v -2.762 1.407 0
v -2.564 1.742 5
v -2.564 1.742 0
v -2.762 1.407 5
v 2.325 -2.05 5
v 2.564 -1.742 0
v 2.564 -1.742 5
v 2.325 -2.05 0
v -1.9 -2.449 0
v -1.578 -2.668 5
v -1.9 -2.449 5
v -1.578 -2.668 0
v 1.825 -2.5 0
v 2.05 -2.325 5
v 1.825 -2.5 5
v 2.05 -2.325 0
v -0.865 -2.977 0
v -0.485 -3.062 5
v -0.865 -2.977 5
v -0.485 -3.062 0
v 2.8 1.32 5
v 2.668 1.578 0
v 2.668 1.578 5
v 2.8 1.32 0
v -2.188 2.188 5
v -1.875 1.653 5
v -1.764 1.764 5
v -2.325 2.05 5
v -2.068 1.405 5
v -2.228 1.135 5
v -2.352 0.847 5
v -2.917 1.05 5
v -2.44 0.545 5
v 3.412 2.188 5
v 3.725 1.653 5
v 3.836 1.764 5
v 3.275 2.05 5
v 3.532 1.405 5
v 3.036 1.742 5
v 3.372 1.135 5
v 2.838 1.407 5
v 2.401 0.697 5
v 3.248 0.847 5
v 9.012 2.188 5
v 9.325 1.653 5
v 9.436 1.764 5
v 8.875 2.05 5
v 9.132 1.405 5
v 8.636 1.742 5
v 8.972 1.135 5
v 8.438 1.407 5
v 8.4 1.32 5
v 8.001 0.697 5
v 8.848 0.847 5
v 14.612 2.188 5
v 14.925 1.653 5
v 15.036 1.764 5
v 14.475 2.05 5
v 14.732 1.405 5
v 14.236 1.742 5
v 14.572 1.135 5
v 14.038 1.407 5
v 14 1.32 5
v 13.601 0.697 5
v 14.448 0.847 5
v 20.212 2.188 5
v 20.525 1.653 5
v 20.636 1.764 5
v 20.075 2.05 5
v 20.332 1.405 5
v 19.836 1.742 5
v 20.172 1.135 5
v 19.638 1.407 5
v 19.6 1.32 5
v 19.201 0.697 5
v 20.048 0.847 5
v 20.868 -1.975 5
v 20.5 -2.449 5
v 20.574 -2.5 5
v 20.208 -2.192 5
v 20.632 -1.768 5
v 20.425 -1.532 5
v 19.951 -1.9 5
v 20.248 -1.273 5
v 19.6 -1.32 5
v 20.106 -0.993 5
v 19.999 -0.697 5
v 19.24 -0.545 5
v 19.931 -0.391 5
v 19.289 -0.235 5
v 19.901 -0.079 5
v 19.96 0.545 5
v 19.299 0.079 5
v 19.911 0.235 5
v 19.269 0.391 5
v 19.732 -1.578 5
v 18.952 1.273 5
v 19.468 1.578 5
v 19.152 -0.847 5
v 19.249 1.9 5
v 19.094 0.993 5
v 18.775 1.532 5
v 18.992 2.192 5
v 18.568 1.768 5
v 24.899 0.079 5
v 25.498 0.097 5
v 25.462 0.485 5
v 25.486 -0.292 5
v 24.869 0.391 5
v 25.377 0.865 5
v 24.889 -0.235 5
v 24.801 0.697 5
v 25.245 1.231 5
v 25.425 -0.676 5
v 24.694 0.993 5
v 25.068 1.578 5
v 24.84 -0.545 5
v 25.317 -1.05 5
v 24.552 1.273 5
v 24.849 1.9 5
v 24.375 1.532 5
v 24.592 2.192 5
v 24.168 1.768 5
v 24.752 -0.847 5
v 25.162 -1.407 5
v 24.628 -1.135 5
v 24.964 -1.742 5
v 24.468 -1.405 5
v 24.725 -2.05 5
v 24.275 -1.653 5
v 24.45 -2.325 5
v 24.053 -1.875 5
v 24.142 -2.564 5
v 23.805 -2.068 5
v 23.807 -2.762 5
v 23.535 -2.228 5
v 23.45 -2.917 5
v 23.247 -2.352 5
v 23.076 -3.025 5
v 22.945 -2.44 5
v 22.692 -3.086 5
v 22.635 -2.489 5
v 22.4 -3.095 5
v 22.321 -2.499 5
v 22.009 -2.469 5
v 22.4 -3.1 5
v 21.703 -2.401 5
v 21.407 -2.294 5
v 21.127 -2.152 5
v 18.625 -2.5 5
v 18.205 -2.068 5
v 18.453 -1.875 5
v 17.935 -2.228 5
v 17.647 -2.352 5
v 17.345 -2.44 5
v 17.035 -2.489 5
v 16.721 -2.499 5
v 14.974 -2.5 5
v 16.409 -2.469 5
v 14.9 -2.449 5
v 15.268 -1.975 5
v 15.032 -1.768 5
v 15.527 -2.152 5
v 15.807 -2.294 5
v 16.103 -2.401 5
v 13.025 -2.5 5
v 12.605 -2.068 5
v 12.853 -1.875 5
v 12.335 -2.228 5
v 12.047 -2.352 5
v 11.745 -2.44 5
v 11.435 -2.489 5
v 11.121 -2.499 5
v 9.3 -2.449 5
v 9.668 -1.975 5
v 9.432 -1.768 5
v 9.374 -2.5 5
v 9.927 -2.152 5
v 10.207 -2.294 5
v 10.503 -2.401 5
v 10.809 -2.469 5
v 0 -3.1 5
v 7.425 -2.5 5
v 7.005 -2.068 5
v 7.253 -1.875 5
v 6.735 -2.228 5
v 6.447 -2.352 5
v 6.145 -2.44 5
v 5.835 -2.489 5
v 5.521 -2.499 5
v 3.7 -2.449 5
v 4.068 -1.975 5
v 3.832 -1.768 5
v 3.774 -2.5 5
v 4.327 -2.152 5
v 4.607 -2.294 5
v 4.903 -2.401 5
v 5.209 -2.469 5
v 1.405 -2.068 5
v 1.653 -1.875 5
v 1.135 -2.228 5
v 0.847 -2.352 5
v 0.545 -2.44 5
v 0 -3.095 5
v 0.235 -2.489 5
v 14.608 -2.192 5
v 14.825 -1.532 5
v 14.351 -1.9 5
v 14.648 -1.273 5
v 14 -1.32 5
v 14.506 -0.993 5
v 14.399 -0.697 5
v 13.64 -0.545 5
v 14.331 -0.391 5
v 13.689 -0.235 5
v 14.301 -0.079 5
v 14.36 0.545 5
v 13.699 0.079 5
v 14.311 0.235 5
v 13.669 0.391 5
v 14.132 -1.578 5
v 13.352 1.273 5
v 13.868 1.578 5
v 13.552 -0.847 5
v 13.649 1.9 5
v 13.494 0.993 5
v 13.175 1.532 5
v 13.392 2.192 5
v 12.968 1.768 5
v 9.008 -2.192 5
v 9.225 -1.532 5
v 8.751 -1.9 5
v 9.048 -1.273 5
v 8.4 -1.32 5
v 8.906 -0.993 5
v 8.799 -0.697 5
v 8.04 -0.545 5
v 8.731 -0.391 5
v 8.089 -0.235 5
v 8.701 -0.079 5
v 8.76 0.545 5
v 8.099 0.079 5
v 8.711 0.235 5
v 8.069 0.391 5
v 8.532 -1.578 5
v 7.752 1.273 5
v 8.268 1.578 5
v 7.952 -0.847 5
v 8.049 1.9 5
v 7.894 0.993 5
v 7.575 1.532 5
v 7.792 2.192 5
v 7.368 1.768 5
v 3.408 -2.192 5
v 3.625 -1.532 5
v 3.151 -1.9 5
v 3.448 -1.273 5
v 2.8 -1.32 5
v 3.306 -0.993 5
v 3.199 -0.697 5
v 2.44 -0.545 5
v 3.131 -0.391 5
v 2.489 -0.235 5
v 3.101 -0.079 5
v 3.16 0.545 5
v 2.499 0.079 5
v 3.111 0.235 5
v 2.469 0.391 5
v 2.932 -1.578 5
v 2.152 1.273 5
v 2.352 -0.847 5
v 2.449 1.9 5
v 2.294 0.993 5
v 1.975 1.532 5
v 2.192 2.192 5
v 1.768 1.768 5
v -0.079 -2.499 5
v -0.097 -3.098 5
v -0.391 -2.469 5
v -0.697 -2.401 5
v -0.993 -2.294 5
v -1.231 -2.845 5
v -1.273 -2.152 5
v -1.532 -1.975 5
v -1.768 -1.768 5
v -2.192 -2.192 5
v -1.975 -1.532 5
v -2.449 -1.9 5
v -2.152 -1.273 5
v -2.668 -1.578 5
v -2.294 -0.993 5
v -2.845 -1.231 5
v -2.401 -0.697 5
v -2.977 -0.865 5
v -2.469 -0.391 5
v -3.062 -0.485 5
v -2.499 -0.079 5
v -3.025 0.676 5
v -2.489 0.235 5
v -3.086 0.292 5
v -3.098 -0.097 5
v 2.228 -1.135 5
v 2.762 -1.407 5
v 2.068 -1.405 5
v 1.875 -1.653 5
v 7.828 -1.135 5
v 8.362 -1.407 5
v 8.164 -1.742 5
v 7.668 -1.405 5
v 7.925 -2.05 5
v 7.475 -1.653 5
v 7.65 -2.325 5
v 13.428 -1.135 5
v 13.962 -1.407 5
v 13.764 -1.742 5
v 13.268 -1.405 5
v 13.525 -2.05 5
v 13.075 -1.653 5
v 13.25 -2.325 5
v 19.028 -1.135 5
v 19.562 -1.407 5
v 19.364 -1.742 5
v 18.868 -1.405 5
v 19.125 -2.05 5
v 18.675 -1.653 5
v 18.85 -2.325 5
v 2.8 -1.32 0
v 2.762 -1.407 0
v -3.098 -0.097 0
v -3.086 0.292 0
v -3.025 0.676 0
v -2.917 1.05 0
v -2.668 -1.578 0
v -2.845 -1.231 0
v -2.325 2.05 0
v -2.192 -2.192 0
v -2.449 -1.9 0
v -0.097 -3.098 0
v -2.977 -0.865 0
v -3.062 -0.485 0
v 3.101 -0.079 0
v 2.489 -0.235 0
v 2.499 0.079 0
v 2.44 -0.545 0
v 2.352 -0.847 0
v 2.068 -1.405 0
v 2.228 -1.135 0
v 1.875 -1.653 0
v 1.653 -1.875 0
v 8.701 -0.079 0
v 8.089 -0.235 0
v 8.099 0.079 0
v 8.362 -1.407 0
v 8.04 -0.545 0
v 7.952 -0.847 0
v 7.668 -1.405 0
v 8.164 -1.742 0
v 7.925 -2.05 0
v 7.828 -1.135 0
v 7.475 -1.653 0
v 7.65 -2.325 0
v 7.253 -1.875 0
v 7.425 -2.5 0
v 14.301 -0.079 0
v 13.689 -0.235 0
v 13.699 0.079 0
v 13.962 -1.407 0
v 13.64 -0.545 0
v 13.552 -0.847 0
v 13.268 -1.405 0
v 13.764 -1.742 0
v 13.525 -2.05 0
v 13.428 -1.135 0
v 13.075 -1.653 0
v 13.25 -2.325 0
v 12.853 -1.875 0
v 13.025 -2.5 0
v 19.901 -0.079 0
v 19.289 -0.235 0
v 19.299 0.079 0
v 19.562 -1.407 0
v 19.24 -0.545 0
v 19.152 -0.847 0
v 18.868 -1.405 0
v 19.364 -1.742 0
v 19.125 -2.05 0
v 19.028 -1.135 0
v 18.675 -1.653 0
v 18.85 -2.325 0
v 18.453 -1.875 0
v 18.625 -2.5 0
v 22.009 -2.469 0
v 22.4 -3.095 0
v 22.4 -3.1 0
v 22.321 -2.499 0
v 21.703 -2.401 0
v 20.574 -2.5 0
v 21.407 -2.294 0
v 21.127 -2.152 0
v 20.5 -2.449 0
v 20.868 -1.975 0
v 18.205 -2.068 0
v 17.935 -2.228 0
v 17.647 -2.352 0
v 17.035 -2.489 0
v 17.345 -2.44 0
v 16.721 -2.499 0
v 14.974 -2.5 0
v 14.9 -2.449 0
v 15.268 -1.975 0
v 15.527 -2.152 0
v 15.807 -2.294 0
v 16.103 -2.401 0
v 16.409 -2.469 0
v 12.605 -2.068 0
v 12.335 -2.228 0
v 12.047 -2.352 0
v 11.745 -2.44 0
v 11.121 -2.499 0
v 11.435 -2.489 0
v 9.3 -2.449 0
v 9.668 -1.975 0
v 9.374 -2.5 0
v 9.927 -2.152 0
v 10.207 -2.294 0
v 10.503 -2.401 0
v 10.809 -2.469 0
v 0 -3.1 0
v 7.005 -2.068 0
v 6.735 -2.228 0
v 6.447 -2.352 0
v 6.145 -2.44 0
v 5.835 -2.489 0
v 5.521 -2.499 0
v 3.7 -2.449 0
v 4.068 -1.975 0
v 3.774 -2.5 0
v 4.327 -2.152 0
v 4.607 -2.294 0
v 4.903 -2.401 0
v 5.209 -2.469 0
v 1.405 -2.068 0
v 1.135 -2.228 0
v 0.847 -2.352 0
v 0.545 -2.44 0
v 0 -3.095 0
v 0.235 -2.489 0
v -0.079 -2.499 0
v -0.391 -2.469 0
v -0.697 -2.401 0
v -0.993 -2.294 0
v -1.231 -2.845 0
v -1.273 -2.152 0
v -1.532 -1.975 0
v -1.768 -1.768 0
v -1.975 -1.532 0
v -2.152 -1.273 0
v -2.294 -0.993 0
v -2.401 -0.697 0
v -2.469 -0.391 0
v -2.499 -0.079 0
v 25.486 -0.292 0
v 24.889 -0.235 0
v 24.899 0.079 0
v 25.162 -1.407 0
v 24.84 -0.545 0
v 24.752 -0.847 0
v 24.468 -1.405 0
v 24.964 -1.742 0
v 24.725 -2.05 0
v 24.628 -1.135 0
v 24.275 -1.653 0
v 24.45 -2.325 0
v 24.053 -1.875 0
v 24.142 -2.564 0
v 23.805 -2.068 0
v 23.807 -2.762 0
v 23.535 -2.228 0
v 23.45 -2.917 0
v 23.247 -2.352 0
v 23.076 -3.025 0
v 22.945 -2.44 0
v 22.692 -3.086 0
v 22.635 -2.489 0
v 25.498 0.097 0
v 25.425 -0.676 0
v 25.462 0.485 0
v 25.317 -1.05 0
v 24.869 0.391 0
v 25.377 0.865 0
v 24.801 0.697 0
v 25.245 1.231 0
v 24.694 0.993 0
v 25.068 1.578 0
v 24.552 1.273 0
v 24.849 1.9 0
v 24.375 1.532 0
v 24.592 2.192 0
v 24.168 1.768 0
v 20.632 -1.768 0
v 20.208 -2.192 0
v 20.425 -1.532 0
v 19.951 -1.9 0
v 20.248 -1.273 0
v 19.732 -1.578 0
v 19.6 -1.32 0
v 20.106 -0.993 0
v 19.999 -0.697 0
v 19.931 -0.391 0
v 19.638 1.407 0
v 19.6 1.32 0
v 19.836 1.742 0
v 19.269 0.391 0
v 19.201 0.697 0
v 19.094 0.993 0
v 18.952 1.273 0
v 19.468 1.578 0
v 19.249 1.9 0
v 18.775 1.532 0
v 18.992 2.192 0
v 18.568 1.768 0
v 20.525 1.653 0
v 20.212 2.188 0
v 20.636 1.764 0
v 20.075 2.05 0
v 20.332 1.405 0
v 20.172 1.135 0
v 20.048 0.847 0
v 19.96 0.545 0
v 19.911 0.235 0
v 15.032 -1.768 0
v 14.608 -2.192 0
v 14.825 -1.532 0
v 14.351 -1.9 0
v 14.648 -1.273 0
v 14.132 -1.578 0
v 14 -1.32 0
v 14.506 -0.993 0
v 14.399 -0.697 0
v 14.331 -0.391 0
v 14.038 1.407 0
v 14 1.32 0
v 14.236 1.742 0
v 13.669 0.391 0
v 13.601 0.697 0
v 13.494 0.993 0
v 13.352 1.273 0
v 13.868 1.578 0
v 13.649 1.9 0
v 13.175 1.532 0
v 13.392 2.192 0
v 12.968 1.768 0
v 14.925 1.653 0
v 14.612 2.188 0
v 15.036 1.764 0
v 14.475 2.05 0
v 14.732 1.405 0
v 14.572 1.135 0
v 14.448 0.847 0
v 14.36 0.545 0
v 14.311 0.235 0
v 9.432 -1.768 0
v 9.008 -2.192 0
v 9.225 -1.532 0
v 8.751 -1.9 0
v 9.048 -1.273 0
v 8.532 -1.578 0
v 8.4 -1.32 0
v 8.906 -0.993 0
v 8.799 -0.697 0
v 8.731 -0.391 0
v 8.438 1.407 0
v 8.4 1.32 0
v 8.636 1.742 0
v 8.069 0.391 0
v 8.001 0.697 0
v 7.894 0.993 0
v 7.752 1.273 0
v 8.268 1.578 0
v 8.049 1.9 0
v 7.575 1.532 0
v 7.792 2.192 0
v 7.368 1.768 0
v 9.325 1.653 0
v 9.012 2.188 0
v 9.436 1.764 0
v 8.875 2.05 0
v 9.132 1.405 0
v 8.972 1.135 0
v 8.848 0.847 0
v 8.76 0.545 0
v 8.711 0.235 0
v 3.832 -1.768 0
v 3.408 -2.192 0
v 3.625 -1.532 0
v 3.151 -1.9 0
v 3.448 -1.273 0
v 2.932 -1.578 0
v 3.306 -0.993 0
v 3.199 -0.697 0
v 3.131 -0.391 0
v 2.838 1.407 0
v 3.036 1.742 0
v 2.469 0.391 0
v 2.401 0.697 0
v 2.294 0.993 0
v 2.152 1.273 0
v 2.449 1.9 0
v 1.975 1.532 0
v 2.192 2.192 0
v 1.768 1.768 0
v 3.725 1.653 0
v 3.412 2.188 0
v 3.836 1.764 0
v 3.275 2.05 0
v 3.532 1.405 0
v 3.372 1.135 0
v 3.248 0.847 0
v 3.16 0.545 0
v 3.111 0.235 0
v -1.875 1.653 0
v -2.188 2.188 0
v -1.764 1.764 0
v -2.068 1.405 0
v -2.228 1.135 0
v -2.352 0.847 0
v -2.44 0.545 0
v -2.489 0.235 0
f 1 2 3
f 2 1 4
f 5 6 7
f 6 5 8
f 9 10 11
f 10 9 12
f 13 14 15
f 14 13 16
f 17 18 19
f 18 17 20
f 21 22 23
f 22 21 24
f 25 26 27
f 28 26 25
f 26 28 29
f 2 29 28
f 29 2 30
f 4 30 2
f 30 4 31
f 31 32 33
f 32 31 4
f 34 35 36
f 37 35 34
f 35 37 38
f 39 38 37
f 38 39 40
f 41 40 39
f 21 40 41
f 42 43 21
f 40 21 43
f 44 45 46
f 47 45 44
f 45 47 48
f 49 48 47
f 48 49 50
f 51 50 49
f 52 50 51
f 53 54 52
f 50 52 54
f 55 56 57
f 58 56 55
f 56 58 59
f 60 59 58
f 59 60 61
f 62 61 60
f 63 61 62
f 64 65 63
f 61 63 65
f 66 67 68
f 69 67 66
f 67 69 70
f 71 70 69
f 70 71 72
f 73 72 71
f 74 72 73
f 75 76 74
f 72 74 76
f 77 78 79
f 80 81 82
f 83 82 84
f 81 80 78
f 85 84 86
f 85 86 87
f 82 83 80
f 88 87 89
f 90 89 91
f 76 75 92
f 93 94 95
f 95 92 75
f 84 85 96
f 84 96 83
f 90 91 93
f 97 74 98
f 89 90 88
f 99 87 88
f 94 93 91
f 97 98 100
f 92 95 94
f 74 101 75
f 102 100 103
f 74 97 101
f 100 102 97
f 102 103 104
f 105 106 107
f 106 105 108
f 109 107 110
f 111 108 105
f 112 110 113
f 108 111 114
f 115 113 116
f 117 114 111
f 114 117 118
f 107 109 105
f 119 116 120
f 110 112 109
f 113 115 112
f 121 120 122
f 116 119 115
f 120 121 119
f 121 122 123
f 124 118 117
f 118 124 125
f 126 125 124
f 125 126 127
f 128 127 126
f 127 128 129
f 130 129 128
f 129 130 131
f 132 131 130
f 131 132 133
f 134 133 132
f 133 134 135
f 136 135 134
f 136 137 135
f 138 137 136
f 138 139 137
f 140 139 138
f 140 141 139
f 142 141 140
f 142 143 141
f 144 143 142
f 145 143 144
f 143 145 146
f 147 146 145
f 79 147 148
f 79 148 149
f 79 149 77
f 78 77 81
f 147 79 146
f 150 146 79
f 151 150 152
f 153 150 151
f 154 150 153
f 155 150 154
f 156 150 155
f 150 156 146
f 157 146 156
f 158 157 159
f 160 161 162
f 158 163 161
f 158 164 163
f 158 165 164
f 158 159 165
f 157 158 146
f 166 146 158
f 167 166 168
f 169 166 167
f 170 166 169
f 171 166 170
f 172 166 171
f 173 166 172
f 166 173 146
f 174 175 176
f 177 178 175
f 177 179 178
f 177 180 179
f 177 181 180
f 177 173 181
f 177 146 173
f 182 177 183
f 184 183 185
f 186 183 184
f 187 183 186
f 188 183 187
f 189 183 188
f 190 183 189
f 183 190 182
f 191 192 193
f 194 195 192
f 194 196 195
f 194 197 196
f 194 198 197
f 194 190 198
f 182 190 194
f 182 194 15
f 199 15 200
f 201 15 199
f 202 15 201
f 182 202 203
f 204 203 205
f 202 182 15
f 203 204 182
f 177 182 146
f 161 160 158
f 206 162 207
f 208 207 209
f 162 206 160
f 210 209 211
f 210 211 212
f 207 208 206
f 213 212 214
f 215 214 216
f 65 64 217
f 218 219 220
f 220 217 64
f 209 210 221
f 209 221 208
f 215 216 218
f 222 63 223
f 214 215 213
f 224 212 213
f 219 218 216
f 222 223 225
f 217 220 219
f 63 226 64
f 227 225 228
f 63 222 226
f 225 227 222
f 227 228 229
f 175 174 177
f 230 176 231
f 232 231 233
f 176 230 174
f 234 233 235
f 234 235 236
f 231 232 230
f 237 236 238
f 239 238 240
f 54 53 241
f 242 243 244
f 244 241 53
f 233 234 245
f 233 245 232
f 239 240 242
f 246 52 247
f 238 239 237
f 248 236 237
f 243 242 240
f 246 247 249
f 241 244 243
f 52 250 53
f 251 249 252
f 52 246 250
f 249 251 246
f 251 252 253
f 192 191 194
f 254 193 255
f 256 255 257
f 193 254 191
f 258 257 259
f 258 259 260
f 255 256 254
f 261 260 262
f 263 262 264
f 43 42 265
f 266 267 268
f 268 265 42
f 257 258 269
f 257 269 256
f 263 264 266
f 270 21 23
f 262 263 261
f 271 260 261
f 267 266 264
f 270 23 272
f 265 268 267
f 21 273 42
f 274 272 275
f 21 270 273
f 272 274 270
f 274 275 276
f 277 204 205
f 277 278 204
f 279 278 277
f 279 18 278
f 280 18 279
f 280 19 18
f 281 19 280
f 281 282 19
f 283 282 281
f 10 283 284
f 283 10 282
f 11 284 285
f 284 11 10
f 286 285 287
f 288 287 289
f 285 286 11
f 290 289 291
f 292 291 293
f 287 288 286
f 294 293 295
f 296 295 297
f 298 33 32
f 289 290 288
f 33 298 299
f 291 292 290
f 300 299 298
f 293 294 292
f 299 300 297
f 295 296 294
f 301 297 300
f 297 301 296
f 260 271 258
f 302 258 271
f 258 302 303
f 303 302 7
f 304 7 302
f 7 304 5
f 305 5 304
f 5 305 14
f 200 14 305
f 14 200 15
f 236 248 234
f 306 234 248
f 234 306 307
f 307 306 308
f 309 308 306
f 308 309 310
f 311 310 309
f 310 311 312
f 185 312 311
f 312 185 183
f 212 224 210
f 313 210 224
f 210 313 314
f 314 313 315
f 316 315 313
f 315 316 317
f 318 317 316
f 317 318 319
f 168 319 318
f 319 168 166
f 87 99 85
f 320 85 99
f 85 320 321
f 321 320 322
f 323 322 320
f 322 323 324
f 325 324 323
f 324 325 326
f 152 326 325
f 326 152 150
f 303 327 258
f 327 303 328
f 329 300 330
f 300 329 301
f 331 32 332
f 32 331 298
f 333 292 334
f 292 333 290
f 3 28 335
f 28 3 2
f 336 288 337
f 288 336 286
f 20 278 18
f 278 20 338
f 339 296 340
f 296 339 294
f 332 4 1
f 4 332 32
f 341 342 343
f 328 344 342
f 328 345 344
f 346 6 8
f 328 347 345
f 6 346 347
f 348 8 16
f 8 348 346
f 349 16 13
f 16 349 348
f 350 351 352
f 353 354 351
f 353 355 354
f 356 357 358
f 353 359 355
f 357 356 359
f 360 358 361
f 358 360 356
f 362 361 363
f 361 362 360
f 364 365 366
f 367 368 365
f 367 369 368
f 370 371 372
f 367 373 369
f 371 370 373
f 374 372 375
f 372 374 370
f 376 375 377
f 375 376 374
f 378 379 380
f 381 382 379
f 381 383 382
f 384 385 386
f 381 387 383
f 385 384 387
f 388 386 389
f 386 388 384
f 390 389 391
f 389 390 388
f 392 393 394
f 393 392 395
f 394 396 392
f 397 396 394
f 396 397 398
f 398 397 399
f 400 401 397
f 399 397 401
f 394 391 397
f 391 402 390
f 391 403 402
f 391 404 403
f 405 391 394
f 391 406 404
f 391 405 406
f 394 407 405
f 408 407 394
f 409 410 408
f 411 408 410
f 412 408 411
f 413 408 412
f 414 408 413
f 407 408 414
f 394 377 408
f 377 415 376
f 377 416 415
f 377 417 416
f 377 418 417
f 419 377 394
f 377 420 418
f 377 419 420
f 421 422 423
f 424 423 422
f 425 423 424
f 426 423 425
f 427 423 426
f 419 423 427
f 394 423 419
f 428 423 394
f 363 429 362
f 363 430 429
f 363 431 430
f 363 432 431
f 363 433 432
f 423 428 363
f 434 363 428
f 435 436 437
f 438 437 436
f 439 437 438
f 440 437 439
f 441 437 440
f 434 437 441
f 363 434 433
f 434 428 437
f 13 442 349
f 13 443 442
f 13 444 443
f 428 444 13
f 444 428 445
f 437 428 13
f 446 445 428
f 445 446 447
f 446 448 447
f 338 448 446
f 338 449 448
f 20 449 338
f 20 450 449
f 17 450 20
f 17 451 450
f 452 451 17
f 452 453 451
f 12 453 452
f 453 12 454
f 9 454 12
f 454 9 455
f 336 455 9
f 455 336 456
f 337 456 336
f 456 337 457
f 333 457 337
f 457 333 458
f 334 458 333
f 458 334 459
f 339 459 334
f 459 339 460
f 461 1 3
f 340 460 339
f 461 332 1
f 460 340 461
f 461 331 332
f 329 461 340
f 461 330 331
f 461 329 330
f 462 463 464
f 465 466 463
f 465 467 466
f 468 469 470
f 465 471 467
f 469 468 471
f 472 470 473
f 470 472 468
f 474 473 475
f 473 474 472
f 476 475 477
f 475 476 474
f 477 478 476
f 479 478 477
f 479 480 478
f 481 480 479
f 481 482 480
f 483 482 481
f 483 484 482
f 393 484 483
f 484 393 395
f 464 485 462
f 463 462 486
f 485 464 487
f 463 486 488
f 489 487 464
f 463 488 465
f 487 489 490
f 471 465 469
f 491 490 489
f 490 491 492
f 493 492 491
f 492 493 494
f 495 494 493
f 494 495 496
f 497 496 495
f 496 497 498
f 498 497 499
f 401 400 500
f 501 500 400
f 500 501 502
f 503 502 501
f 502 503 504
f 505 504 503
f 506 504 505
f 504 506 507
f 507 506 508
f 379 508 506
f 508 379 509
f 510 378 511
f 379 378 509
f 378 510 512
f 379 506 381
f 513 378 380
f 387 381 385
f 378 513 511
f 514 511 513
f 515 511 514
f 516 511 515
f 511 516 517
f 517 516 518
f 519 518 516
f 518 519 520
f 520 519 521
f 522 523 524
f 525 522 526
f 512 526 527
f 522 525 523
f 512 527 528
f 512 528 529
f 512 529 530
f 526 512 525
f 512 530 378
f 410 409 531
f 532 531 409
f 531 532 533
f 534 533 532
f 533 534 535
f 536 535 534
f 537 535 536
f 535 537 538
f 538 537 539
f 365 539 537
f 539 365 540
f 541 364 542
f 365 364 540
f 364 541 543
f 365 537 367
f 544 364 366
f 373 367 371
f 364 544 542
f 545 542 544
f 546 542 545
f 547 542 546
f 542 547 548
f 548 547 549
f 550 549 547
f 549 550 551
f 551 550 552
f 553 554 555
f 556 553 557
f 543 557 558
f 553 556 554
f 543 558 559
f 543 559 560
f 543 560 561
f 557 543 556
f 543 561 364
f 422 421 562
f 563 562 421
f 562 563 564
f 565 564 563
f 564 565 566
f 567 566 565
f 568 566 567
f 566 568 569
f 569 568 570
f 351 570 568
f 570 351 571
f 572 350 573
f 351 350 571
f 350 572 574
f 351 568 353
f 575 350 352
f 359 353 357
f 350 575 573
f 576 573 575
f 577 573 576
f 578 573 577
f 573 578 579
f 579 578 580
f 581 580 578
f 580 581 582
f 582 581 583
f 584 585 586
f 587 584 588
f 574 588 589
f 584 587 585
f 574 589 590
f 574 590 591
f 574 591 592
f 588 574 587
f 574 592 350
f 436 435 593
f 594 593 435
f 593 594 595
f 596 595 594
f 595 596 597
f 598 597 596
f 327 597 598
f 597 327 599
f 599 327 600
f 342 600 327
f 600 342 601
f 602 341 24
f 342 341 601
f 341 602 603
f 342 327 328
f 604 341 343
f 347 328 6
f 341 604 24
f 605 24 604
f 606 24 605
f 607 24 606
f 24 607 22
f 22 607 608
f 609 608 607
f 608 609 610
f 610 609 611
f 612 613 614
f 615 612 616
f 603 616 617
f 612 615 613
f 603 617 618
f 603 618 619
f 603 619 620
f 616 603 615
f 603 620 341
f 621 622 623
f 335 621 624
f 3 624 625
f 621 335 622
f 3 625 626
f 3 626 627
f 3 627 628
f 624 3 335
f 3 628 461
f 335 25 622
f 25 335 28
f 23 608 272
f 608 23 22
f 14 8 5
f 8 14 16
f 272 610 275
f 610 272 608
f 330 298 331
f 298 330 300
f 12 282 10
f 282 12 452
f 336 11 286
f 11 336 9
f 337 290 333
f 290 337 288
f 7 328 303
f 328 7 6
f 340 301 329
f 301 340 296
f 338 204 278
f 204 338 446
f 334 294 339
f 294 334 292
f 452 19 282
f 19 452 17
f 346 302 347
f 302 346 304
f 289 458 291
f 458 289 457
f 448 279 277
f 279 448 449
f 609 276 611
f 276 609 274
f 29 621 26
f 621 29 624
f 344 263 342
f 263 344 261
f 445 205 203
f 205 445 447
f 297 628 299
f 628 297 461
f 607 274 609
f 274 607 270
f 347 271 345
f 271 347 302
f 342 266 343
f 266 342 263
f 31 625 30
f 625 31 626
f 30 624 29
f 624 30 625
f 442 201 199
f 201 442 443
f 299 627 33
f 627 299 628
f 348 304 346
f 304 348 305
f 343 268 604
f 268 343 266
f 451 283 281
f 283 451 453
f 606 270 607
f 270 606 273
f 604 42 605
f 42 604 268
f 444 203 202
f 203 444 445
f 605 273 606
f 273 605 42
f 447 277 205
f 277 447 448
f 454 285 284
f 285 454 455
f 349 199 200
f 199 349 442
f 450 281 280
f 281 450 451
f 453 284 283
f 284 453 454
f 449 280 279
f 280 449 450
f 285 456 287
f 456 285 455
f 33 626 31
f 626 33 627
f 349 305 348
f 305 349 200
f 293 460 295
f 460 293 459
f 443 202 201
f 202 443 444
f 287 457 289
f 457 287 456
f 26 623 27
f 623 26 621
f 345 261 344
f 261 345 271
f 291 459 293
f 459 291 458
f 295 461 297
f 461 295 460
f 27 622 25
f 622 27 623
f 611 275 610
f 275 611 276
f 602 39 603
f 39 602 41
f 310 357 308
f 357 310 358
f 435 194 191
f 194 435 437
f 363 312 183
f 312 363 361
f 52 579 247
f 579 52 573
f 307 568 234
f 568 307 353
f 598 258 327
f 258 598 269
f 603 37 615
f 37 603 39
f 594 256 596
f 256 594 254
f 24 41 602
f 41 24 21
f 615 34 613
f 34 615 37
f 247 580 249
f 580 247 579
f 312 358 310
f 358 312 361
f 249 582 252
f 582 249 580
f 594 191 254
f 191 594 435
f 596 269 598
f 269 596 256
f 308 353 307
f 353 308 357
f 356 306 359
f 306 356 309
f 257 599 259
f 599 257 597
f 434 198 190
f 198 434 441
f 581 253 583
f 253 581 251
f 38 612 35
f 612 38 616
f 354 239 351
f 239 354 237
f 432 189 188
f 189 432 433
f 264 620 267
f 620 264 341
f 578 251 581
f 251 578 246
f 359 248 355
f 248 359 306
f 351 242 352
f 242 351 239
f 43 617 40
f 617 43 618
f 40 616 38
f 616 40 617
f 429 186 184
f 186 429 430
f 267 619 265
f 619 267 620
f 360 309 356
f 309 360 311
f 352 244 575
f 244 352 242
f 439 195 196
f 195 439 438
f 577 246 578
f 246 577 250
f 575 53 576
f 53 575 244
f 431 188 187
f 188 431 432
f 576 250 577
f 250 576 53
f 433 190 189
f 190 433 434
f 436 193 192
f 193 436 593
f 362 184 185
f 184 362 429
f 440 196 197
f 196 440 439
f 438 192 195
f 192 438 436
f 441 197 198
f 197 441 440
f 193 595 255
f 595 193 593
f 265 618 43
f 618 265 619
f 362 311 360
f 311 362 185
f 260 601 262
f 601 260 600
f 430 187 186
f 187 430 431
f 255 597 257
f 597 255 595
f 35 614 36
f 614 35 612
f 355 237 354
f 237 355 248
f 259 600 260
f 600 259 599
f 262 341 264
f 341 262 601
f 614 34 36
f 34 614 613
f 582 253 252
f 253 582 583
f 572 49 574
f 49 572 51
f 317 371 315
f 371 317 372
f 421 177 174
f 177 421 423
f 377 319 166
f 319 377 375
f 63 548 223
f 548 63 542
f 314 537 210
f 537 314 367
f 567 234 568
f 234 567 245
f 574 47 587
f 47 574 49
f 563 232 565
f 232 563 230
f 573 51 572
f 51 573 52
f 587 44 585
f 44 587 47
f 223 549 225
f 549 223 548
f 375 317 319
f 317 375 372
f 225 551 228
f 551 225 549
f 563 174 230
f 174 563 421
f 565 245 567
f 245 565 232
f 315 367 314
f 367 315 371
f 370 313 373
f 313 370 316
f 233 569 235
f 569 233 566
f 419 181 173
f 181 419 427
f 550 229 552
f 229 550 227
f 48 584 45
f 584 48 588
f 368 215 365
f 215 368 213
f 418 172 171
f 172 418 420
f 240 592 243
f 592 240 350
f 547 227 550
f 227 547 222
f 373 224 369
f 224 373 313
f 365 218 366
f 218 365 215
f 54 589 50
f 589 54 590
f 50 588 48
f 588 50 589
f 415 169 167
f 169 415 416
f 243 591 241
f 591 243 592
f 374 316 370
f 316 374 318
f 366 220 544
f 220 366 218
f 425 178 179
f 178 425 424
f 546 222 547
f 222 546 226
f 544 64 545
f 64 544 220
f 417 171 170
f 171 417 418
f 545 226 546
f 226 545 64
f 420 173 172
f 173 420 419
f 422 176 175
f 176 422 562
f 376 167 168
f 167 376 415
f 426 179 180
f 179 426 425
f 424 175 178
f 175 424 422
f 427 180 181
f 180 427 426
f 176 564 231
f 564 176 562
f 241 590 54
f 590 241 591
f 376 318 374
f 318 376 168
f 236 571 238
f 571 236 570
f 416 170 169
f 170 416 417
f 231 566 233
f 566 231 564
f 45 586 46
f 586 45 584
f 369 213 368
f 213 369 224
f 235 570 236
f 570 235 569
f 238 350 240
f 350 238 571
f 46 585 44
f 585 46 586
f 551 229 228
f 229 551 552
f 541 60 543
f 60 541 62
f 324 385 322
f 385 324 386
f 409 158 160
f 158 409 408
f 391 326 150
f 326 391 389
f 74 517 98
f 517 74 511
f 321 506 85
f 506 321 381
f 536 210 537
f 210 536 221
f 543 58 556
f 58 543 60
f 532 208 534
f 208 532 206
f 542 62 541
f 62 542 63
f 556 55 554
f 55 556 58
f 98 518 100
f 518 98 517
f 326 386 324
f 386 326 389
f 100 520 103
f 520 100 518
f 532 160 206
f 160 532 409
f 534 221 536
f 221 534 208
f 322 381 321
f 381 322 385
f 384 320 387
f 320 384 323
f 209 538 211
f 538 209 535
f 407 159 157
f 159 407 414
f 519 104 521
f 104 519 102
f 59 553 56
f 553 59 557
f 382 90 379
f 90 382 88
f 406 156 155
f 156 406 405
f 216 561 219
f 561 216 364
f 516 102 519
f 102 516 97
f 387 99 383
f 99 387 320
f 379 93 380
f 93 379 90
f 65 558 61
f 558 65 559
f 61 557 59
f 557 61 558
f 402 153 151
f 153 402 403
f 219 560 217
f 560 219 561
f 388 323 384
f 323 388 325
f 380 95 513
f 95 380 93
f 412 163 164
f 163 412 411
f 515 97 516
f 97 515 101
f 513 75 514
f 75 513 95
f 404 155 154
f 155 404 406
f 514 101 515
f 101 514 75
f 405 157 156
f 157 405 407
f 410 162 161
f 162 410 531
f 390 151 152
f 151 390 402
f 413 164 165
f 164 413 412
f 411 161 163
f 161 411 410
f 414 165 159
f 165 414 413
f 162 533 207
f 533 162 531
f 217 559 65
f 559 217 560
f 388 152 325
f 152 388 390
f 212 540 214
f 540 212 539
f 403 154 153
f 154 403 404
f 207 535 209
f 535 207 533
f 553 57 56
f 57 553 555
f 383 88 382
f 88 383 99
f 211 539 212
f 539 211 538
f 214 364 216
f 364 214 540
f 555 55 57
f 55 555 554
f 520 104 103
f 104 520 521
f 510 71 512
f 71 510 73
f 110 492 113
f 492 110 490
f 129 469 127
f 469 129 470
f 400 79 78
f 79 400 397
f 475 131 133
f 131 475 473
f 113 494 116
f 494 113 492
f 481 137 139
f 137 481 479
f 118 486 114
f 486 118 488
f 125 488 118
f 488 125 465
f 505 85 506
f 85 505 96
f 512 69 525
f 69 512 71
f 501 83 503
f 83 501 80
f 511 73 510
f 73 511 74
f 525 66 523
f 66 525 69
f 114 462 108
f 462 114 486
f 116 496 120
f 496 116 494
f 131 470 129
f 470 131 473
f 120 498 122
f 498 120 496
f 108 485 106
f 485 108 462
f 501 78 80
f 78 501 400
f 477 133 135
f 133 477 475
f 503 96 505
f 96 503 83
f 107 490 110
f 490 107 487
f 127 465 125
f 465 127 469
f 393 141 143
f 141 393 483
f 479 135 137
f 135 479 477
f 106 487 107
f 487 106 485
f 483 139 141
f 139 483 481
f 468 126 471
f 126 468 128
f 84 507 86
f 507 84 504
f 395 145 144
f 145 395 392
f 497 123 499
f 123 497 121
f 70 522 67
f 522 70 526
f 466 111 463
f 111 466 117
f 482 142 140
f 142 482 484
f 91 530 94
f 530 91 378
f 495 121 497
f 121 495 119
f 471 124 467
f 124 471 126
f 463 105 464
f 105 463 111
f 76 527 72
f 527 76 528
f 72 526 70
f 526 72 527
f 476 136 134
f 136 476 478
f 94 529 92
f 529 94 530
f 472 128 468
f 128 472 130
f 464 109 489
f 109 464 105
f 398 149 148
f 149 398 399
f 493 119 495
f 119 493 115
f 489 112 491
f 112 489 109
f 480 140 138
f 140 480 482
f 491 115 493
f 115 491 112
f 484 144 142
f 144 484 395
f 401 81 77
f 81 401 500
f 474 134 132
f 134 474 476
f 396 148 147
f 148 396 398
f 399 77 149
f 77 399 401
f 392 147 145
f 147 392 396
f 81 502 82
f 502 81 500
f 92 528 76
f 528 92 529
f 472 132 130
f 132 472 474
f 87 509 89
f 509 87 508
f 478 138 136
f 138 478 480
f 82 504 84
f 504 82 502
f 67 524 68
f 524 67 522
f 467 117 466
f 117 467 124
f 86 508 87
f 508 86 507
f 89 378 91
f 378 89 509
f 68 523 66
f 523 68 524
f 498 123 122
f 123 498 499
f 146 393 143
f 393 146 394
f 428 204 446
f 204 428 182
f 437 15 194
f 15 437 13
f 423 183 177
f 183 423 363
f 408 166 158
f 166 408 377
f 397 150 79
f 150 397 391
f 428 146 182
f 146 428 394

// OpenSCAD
$fn = 50;

thickness = 0.6;
diameter = 5;
height = 5;
elements = 5;


module unit(d = diameter, t = thickness) {
  out_r = (d / 2) + t;
  in_r = d / 2;

  rotate(45, [0, 0, 1])
    difference() {
      cylinder(height, r=out_r);
      cylinder(height, r=in_r);
      cube([d, d, height]);
    }
}


module tape(n = elements, d = diameter, t = thickness, support = false) {
  space = d + t;
  for(i = [0 : n-1]) {
    translate([i * space, 0, 0])
      unit();
  }
  if (support) {
    translate([0, -(d / 2 + t), 0])
      cube([space * (n - 1), t, height]);
  }
}


module mixed_tape(elements, t = thickness, support = false) {
  function add(list, stop = len(list), i = 0, acc = 0) =
    i <= stop
      ? add(list, stop = stop, i = i + 1, acc = acc + list[i])
      : acc;

  for (idx = [0 : len(elements)]) {
    space = add(elements, stop = idx, acc = t);
    d = elements[idx];
    translate([space + t, (d / 2), 0])
      unit(d = d);
    newspace = space + d;
  }

  if (support) {
    space = add(elements, stop = len(elements)-2);
    shift = add(elements, stop = 0);
    echo (space);
    translate([shift, -t, 0])
      cube([space * len(elements), thickness, height]);
  }
}

tape(support = true);
/* mixed_tape([5,5,6,6,6,7,8,9,9,9], support = true); */
